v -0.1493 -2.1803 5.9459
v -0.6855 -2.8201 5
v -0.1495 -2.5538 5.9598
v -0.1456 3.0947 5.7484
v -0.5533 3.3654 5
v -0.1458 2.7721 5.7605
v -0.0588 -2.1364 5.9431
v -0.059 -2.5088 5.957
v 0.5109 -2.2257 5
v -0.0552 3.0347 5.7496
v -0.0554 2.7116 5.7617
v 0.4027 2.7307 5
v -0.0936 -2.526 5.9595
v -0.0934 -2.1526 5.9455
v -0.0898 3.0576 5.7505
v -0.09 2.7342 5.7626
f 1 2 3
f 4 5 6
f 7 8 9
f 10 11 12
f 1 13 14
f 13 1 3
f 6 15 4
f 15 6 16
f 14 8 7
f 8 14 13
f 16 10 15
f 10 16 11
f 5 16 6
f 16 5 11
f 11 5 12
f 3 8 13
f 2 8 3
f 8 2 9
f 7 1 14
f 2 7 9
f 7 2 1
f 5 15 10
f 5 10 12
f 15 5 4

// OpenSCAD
// Auto-generated OpenSCAD file

    inner_points = 10*[[-0.4431428263878504, -0.4570616481590885, 0.5000000000000111], [-0.4431428263878677, -0.4570616481591002, -0.49999999999998884], [-0.38067743121914766, 0.5409854821941918, 0.4999999999999984], [-0.3806774312191651, 0.5409854821941802, -0.5000000000000016], [0.452424040256601, -0.012134702055978608, 0.49999999999999045], [0.45242404025658345, -0.012134702055990293, -0.5000000000000095], [-0.12379873911678495, 0.023929710659717798, 1.316496580927726], [-0.12379873911683055, 0.023929710659686996, -1.316496580927726]];

    outer_points = 10*[[-0.49420916328855335, 0.48885165398079056, -0.3164090653808874], [-0.4949038486176348, -0.5104484675685688, -0.27900873805973586], [0.505618378810838, 0.48885165398079056, -0.2978379571886004], [0.5049236934817566, -0.5104484675685688, -0.26043762986744884], [-0.01036718752866248, 0.5212468743624579, 0.5581465315877604], [-0.011061872857743975, -0.4780532471869015, 0.5955468589089121], [0.0009145508605564383, 1.3155751933403925, -0.0492374030438739], [-0.0009145508605564383, -1.3155751933403925, 0.0492374030438739]];

    // Convex hull for inner set (I)
    module inner_hull() {
        hull() {
            for (p = inner_points) {
                translate(p) sphere(r=0.1);
            }
        }
    }

    // Convex hull for outer set (O) minus inner hull (O \ I)
    module outer_minus_inner() {
        difference() {
            hull() {
                for (p = outer_points) {
                    translate(p) sphere(r=0.1);
                }
            }
            inner_hull(); // Subtract inner hull
        }
    }

    // Convex hull for outer set (O) minus all translated inner hulls
    module outer_minus_AllTranslationInner() {
        difference() {
            hull() {
                for (p = outer_points) {
                    translate(p) sphere(r=0.1);
                }
            }
            hull() {
                translate([0,0,50]) inner_hull();
                translate([0,0,-50]) inner_hull();
            }; // Subtract translated inner hulls
        }
    }

    // Difference between outer_minus_inner and outer_minus_AllTranslationInner
    module outer_minus_inner_diff() {
        difference() {
            // Outer minus inner
            difference() {
                hull() {
                    for (p = outer_points) {
                        translate(p) sphere(r=0.1);
                    }
                }
                inner_hull();
            }

            // Subtract Outer minus AllTranslationInner
            difference() {
                hull() {
                    for (p = outer_points) {
                        translate(p) sphere(r=0.1);
                    }
                }
                hull() {
                    translate([0,0,50]) inner_hull();
                    translate([0,0,-50]) inner_hull();
                };
            }
        }
    }

    // Rendering all with colors applied
    color([1, 1, 0, 1]) outer_minus_inner_diff(); // Opaque yellow
    
